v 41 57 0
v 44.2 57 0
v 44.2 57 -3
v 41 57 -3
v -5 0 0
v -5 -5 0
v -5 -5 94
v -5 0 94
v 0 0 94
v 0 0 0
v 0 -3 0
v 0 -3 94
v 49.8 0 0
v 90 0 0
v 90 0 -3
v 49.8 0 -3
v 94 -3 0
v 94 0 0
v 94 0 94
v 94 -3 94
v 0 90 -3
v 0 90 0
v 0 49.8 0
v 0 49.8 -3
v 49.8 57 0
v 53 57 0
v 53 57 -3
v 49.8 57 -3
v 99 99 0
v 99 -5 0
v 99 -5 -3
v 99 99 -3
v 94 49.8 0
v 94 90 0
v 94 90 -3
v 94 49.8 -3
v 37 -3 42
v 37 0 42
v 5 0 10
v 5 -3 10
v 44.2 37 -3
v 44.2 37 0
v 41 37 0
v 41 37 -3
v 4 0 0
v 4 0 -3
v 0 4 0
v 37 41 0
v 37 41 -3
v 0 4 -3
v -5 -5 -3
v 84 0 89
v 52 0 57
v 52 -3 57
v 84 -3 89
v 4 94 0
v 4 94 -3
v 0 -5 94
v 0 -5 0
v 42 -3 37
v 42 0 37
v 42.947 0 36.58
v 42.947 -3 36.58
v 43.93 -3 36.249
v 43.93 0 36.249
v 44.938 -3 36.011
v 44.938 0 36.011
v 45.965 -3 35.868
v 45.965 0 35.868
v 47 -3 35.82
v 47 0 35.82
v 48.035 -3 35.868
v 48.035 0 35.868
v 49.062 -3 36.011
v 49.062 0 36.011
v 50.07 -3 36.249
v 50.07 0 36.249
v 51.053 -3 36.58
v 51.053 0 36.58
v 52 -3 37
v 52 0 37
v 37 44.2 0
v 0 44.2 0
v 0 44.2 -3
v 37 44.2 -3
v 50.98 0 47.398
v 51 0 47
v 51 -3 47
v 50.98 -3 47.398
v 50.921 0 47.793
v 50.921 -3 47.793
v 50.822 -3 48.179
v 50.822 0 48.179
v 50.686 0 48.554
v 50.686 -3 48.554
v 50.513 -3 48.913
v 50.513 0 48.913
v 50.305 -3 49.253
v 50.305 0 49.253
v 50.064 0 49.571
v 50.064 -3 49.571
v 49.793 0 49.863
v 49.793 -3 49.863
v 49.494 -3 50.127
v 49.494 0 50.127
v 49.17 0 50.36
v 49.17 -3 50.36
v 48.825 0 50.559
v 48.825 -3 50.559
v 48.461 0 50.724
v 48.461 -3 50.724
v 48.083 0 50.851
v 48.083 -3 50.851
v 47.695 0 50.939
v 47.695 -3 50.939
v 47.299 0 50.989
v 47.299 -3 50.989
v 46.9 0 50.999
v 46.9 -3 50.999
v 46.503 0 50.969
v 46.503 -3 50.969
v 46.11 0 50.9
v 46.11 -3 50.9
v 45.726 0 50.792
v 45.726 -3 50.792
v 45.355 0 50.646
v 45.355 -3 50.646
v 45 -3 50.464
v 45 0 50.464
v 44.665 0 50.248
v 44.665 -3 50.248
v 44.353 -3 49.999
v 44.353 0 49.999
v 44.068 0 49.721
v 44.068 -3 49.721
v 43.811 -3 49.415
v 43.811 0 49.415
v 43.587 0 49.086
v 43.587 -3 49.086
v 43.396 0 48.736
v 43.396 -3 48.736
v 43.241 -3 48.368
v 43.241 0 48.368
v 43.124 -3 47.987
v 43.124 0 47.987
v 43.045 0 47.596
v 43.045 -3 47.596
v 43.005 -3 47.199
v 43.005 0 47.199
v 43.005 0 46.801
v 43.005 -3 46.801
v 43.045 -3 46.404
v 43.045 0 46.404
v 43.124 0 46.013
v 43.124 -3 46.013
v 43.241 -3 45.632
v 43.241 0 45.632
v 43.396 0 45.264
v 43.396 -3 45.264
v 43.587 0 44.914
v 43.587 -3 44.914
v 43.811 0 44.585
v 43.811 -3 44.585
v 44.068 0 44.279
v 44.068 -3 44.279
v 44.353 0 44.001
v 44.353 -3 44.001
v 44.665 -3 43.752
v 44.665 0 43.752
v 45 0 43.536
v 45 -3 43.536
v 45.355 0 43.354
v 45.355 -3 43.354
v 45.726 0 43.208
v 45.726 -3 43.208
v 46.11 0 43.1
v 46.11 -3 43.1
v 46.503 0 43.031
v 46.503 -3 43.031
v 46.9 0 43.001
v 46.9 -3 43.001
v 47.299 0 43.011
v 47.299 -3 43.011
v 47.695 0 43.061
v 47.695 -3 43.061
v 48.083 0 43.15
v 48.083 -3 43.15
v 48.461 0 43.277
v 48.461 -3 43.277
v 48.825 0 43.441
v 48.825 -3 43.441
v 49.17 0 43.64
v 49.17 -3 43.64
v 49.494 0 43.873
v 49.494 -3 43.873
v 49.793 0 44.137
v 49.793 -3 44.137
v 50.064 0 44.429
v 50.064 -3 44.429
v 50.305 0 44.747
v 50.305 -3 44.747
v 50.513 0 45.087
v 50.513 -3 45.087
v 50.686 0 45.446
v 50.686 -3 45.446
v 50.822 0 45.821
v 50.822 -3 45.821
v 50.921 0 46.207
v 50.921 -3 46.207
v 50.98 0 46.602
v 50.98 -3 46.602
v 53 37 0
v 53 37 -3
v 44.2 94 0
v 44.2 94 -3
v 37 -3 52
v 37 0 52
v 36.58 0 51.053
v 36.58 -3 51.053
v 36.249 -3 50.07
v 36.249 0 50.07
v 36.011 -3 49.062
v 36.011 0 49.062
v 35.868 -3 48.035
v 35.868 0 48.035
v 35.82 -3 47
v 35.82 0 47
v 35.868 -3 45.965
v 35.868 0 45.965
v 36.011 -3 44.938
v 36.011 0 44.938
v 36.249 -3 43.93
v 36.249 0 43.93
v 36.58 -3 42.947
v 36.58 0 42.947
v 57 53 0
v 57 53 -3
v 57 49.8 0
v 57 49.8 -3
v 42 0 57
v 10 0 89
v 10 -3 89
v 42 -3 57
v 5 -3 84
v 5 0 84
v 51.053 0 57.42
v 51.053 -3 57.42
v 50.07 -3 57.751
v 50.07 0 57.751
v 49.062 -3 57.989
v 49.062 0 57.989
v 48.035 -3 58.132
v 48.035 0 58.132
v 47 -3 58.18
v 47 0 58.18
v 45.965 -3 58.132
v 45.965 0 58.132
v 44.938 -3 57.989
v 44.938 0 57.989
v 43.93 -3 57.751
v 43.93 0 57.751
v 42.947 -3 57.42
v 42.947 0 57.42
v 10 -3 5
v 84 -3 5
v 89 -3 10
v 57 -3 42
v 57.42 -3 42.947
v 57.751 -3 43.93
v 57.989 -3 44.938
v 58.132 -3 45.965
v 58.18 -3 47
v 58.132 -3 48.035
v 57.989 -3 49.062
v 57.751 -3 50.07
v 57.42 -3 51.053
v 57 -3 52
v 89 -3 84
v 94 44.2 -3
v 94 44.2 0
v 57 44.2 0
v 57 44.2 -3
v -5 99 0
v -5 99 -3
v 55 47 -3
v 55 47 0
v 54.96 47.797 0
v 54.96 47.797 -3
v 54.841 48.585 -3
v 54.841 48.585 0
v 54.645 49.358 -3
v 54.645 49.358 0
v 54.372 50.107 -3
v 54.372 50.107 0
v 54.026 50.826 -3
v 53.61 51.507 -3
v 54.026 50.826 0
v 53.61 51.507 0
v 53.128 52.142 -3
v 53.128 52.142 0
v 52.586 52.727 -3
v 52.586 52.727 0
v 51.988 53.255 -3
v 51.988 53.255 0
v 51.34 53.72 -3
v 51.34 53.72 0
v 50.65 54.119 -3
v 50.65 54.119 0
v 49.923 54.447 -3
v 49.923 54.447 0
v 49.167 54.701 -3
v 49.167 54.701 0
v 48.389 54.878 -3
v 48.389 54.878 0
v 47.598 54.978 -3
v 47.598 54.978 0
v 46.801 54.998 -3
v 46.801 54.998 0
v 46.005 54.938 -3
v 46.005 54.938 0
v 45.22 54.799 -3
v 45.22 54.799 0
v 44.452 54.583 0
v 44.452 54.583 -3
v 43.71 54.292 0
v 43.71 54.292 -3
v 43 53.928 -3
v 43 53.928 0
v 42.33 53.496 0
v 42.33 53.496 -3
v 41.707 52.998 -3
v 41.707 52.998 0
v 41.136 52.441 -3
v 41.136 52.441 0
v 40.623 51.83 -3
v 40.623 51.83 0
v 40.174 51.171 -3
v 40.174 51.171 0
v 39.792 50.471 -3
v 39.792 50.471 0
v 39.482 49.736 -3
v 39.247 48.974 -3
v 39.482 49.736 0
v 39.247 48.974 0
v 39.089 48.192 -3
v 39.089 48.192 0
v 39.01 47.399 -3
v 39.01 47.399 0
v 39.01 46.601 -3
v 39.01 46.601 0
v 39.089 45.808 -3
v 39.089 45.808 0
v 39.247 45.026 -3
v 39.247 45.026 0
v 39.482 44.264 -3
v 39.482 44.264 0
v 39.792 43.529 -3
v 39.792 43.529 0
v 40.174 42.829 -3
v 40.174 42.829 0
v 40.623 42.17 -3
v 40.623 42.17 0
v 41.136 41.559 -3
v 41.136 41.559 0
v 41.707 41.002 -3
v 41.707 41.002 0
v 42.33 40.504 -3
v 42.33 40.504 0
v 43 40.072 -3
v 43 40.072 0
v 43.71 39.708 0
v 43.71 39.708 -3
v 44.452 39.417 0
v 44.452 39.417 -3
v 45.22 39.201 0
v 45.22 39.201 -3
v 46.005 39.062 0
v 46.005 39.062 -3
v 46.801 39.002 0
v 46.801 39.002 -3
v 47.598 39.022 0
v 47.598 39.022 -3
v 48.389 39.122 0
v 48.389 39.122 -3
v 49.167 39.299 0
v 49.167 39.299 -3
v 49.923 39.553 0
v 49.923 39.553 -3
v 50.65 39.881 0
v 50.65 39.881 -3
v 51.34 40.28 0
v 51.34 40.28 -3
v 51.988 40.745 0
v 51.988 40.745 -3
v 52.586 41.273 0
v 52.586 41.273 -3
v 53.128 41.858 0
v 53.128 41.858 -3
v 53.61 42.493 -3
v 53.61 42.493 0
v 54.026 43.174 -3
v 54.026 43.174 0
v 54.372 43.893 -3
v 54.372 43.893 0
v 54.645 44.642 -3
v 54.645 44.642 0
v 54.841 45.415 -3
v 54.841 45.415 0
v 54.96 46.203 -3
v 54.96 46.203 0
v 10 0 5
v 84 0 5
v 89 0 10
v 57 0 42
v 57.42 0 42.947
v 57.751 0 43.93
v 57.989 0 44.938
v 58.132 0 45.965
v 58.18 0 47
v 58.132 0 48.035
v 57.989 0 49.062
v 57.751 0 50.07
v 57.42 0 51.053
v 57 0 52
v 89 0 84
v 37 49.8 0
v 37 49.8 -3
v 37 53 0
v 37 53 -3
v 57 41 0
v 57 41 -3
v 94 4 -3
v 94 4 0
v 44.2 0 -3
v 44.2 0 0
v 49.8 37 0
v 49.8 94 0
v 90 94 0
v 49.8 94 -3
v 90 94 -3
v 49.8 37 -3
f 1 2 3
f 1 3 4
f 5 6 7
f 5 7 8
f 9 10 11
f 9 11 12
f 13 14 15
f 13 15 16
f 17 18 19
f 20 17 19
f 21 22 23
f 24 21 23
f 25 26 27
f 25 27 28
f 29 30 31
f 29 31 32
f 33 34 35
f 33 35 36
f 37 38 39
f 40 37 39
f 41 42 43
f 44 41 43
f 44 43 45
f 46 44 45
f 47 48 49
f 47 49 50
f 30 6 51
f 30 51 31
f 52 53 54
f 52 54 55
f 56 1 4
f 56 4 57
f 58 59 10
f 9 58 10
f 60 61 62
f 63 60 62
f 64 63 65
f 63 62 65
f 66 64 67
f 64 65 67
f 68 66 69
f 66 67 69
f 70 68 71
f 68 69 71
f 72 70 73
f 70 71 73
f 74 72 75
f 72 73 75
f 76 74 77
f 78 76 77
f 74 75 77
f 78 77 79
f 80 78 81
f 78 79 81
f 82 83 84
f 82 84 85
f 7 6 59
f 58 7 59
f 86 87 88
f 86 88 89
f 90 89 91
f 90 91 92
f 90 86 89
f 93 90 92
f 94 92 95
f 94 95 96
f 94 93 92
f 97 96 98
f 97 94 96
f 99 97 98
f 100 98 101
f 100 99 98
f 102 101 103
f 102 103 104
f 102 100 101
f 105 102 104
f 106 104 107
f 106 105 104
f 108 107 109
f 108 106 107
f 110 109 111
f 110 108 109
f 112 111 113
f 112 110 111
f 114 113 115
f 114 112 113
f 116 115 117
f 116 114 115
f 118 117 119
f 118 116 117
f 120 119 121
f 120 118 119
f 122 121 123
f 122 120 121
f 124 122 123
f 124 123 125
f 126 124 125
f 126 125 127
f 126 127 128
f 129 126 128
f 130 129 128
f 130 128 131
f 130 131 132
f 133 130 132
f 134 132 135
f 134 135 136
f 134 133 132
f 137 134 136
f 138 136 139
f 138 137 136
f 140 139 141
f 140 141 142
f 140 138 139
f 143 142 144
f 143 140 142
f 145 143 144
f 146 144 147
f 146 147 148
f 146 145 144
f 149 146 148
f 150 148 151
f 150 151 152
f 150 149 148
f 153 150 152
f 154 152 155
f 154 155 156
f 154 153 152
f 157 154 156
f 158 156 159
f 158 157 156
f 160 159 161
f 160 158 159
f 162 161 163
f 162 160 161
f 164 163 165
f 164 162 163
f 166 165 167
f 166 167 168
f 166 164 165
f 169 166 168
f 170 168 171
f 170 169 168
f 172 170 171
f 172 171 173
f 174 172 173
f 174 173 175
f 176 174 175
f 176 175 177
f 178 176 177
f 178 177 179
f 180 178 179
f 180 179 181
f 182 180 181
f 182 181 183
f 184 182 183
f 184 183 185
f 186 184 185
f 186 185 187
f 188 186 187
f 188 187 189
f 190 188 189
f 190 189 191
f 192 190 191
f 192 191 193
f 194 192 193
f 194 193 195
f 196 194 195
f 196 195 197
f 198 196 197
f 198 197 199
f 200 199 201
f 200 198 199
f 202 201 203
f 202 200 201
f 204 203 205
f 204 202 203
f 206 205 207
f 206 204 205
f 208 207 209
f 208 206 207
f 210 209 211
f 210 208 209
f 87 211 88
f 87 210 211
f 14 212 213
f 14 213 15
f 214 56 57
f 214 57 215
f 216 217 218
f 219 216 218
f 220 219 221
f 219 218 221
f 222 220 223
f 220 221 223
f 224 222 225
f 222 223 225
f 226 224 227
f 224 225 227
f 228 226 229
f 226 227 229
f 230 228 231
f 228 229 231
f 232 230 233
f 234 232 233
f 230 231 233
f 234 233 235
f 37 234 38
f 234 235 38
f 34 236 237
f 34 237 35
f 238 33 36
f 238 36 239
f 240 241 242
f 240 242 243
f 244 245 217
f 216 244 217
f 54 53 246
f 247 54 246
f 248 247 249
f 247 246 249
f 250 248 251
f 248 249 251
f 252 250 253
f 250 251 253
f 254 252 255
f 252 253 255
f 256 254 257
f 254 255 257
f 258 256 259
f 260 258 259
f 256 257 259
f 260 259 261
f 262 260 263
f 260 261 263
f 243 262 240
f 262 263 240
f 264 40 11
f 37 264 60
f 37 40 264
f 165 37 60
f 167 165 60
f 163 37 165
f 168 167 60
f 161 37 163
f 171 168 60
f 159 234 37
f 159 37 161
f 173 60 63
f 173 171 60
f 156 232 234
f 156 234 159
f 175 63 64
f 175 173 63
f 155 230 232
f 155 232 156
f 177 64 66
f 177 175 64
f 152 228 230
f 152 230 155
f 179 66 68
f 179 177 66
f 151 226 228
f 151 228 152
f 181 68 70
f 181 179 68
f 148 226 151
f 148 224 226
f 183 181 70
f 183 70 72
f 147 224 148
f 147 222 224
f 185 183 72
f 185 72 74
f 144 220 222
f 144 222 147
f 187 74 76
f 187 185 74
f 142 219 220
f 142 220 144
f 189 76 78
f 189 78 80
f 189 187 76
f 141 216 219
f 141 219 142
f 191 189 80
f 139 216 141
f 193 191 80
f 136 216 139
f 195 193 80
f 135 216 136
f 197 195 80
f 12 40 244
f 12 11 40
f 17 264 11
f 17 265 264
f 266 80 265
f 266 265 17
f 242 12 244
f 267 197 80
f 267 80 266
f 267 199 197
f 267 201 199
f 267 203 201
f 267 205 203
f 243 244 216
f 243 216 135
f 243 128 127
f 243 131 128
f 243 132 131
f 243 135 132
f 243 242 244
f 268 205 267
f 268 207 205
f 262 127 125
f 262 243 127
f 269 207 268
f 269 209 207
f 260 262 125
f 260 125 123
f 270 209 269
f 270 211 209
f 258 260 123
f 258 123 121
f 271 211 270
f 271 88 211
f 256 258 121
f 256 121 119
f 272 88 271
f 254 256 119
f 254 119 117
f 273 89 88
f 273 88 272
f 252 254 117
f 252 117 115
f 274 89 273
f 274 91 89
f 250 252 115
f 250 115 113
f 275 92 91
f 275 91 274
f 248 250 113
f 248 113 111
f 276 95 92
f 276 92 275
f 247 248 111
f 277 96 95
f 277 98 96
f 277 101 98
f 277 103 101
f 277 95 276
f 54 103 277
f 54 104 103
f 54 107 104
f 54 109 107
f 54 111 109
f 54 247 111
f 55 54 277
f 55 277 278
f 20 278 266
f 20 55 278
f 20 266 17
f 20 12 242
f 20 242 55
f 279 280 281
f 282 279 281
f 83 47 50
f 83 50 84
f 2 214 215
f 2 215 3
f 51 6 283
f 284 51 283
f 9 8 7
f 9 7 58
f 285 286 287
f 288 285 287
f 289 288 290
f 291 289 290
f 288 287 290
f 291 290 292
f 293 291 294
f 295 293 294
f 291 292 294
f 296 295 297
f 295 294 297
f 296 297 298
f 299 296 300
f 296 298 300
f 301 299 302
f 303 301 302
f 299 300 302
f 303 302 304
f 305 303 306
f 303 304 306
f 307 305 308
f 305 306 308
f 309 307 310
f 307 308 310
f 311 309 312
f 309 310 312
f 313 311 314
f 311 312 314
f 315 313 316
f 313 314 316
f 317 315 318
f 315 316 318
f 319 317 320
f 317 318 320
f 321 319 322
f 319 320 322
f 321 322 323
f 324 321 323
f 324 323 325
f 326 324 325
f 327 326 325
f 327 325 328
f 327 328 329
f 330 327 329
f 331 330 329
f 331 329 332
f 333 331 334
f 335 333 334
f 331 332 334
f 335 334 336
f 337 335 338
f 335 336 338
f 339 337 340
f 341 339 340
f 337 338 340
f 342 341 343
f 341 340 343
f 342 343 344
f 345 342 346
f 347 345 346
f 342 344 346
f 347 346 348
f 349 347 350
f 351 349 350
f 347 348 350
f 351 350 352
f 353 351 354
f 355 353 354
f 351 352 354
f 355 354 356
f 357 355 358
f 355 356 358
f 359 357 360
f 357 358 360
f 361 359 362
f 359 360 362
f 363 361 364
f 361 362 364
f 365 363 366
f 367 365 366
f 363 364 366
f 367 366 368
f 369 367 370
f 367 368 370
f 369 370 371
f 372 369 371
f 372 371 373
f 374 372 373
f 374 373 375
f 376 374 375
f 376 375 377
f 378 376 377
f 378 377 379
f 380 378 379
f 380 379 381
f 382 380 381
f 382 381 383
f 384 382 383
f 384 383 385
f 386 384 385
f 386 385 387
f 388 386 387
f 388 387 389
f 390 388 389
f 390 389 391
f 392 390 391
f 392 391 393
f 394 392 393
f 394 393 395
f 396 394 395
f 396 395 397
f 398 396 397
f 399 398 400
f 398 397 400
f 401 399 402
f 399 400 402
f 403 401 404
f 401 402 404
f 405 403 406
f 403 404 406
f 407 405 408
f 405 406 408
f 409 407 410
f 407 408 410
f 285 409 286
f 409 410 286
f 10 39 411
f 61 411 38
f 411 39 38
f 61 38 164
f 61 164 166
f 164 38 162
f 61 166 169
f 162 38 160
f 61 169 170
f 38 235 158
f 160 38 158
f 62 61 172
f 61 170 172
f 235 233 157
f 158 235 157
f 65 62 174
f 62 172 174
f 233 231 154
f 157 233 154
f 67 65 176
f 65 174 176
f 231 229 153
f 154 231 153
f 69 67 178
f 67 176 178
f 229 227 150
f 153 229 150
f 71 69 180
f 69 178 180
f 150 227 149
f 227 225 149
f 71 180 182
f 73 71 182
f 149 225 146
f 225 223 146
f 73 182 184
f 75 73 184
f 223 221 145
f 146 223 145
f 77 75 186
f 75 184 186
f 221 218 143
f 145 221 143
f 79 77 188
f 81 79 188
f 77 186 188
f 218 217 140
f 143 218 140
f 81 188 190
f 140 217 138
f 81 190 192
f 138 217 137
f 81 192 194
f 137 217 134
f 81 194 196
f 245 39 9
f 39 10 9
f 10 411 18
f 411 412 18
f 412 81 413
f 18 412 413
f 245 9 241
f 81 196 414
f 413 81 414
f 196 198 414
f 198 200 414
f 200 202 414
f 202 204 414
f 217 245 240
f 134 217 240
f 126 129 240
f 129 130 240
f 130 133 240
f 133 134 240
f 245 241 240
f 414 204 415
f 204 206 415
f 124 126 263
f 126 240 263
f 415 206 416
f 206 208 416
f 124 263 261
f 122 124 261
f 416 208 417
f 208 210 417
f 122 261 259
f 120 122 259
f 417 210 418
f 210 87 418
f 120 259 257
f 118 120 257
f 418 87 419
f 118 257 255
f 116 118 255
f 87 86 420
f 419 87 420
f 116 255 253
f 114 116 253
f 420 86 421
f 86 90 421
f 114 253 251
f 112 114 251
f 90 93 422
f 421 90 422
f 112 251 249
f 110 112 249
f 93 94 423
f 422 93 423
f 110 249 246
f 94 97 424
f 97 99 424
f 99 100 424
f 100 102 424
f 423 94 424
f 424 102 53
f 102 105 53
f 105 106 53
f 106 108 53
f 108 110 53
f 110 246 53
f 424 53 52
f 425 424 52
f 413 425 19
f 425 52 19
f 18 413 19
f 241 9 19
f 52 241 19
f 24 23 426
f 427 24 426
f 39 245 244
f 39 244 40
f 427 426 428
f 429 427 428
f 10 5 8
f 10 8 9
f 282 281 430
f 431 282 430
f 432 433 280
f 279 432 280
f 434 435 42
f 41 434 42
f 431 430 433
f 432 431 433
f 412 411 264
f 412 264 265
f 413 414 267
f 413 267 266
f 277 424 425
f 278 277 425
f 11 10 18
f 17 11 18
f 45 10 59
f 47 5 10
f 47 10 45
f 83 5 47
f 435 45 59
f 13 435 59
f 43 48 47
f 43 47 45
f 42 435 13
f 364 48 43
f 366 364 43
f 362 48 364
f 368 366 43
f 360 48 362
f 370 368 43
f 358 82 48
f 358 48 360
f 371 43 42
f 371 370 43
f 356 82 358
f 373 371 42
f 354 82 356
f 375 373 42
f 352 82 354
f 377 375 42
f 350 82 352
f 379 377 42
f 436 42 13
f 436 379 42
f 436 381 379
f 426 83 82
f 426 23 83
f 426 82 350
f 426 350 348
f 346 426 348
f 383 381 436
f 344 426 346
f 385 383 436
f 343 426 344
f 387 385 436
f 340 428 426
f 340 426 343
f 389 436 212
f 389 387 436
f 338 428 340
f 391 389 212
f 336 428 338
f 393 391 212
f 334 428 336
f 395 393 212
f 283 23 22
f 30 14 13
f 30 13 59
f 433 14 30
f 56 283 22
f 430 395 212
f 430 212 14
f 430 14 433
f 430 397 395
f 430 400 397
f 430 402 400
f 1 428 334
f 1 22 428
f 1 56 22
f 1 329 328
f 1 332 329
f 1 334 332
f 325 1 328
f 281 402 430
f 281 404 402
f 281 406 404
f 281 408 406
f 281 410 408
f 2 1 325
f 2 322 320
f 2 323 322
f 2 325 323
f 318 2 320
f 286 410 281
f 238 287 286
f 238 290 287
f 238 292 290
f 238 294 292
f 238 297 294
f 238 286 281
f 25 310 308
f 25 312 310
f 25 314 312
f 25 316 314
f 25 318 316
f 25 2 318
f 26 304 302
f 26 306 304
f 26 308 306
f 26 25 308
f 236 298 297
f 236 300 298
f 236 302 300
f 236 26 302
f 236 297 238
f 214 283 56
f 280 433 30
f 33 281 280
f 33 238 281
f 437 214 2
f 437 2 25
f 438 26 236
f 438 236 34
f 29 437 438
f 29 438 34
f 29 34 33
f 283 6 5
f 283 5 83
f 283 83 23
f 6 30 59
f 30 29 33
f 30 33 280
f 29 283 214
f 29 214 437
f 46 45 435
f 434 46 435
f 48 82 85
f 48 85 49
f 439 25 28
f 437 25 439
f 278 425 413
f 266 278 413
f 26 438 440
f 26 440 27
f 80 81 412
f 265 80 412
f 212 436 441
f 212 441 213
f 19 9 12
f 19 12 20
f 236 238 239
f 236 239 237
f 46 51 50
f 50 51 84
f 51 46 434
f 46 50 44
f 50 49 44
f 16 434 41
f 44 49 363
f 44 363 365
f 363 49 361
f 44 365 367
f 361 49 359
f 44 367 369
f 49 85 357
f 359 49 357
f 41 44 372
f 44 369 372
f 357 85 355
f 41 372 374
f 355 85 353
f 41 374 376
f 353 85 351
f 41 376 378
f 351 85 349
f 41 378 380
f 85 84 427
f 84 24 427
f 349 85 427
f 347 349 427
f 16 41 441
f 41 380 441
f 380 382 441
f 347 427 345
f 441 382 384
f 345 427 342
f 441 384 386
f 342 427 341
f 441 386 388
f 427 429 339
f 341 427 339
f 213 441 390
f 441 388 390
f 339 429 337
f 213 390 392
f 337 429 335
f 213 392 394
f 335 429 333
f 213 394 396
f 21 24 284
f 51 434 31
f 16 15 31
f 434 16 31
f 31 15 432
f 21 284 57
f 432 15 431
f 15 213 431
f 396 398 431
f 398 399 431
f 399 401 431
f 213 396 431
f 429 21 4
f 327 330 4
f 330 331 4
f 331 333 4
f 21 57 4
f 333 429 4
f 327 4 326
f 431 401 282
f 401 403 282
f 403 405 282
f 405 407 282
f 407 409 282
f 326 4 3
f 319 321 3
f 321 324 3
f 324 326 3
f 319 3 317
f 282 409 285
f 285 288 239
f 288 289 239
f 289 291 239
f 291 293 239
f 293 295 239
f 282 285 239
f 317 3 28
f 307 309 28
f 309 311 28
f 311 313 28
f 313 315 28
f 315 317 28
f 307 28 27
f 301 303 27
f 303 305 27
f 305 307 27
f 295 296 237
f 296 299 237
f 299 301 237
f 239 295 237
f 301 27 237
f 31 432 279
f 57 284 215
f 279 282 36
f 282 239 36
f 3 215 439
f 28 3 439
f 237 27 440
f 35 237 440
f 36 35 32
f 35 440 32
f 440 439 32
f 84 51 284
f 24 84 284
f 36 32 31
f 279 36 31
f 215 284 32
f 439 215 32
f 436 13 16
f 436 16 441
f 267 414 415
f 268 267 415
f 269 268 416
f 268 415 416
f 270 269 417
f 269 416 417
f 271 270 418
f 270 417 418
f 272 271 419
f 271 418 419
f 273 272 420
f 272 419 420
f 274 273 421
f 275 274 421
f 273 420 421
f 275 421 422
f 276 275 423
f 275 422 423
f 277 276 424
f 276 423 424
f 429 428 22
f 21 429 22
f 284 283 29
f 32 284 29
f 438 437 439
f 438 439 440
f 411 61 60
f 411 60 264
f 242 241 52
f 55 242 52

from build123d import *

# Parameters (mm, degrees)
SKETCH001_W  = 94
SKETCH001_H  = 94
SKETCH001_R  = 4
PAD_DEPTH    = 3
SKETCH003_W  = 104
SKETCH003_H  = 104
SKETCH003_R  = 8
PAD001_DEPTH = 3
SKETCH005_W  = 4.999981
SKETCH005_H  = 4.999828
PAD002_DEPTH = 94


with BuildPart() as front_side_cover:
    # Sketch001 → Pad (new body)
    with BuildSketch(Plane.XZ):
        with Locations((47, 47)):
            Rectangle(SKETCH001_W, SKETCH001_H)
        with Locations((47, 47.000012)):
            Circle(SKETCH001_R, mode=Mode.SUBTRACT)
        with BuildLine():
            Line((10, 89), (42, 57))
            ThreePointArc((52, 57), (47, 58.180341), (42, 57))
            Line((52, 57), (84, 89))
            Line((10, 89), (84, 89))
        make_face(mode=Mode.SUBTRACT)
        with BuildLine():
            Line((5, 84), (37, 52))
            ThreePointArc((37, 52), (35.819661, 47), (37, 42))
            Line((37, 42), (5, 10))
            Line((5, 84), (5, 10))
        make_face(mode=Mode.SUBTRACT)
        with BuildLine():
            Line((57, 52), (89, 84))
            Line((89, 84), (89, 10))
            Line((57, 42), (89, 10))
            ThreePointArc((57, 42), (58.18034, 47), (57, 52))
        make_face(mode=Mode.SUBTRACT)
        with BuildLine():
            Line((42, 37), (10, 5))
            Line((10, 5), (84, 5))
            Line((52, 37), (84, 5))
            ThreePointArc((42, 37), (47, 35.819661), (52, 37))
        make_face(mode=Mode.SUBTRACT)
    extrude(amount=PAD_DEPTH)


with BuildPart() as bottom_chassis:
    # Sketch003 → Pad001 (new body)
    with BuildSketch(Plane.XY):
        with Locations((47, 47)):
            Rectangle(SKETCH003_W, SKETCH003_H)
        with Locations((47, 47)):
            Circle(SKETCH003_R, mode=Mode.SUBTRACT)
        Polygon((37, 53), (0, 90), (0, 49.8), (37, 49.8), align=None, mode=Mode.SUBTRACT)
        Polygon((41, 57), (4, 94), (44.2, 94), (44.2, 57), align=None, mode=Mode.SUBTRACT)
        Polygon((49.8, 57), (49.8, 94), (90, 94), (53, 57), align=None, mode=Mode.SUBTRACT)
        Polygon((37, 41), (0, 4), (0, 44.2), (37, 44.2), align=None, mode=Mode.SUBTRACT)
        Polygon((41, 37), (4, 0), (44.2, 0), (44.2, 37), align=None, mode=Mode.SUBTRACT)
        Polygon((57, 41), (94, 4), (94, 44.2), (57, 44.2), align=None, mode=Mode.SUBTRACT)
        Polygon((53, 37), (90, 0), (49.8, 0), (49.8, 37), align=None, mode=Mode.SUBTRACT)
        Polygon((57, 53), (94, 90), (94, 49.8), (57, 49.8), align=None, mode=Mode.SUBTRACT)
    extrude(amount=-PAD001_DEPTH)

    # Sketch005 → Pad002 (join)
    with BuildSketch(Plane.XY):
        with Locations((-2.499991, -2.499914)):
            Rectangle(SKETCH005_W, SKETCH005_H)
    extrude(amount=PAD002_DEPTH)


solid = Compound([front_side_cover.part, bottom_chassis.part])
